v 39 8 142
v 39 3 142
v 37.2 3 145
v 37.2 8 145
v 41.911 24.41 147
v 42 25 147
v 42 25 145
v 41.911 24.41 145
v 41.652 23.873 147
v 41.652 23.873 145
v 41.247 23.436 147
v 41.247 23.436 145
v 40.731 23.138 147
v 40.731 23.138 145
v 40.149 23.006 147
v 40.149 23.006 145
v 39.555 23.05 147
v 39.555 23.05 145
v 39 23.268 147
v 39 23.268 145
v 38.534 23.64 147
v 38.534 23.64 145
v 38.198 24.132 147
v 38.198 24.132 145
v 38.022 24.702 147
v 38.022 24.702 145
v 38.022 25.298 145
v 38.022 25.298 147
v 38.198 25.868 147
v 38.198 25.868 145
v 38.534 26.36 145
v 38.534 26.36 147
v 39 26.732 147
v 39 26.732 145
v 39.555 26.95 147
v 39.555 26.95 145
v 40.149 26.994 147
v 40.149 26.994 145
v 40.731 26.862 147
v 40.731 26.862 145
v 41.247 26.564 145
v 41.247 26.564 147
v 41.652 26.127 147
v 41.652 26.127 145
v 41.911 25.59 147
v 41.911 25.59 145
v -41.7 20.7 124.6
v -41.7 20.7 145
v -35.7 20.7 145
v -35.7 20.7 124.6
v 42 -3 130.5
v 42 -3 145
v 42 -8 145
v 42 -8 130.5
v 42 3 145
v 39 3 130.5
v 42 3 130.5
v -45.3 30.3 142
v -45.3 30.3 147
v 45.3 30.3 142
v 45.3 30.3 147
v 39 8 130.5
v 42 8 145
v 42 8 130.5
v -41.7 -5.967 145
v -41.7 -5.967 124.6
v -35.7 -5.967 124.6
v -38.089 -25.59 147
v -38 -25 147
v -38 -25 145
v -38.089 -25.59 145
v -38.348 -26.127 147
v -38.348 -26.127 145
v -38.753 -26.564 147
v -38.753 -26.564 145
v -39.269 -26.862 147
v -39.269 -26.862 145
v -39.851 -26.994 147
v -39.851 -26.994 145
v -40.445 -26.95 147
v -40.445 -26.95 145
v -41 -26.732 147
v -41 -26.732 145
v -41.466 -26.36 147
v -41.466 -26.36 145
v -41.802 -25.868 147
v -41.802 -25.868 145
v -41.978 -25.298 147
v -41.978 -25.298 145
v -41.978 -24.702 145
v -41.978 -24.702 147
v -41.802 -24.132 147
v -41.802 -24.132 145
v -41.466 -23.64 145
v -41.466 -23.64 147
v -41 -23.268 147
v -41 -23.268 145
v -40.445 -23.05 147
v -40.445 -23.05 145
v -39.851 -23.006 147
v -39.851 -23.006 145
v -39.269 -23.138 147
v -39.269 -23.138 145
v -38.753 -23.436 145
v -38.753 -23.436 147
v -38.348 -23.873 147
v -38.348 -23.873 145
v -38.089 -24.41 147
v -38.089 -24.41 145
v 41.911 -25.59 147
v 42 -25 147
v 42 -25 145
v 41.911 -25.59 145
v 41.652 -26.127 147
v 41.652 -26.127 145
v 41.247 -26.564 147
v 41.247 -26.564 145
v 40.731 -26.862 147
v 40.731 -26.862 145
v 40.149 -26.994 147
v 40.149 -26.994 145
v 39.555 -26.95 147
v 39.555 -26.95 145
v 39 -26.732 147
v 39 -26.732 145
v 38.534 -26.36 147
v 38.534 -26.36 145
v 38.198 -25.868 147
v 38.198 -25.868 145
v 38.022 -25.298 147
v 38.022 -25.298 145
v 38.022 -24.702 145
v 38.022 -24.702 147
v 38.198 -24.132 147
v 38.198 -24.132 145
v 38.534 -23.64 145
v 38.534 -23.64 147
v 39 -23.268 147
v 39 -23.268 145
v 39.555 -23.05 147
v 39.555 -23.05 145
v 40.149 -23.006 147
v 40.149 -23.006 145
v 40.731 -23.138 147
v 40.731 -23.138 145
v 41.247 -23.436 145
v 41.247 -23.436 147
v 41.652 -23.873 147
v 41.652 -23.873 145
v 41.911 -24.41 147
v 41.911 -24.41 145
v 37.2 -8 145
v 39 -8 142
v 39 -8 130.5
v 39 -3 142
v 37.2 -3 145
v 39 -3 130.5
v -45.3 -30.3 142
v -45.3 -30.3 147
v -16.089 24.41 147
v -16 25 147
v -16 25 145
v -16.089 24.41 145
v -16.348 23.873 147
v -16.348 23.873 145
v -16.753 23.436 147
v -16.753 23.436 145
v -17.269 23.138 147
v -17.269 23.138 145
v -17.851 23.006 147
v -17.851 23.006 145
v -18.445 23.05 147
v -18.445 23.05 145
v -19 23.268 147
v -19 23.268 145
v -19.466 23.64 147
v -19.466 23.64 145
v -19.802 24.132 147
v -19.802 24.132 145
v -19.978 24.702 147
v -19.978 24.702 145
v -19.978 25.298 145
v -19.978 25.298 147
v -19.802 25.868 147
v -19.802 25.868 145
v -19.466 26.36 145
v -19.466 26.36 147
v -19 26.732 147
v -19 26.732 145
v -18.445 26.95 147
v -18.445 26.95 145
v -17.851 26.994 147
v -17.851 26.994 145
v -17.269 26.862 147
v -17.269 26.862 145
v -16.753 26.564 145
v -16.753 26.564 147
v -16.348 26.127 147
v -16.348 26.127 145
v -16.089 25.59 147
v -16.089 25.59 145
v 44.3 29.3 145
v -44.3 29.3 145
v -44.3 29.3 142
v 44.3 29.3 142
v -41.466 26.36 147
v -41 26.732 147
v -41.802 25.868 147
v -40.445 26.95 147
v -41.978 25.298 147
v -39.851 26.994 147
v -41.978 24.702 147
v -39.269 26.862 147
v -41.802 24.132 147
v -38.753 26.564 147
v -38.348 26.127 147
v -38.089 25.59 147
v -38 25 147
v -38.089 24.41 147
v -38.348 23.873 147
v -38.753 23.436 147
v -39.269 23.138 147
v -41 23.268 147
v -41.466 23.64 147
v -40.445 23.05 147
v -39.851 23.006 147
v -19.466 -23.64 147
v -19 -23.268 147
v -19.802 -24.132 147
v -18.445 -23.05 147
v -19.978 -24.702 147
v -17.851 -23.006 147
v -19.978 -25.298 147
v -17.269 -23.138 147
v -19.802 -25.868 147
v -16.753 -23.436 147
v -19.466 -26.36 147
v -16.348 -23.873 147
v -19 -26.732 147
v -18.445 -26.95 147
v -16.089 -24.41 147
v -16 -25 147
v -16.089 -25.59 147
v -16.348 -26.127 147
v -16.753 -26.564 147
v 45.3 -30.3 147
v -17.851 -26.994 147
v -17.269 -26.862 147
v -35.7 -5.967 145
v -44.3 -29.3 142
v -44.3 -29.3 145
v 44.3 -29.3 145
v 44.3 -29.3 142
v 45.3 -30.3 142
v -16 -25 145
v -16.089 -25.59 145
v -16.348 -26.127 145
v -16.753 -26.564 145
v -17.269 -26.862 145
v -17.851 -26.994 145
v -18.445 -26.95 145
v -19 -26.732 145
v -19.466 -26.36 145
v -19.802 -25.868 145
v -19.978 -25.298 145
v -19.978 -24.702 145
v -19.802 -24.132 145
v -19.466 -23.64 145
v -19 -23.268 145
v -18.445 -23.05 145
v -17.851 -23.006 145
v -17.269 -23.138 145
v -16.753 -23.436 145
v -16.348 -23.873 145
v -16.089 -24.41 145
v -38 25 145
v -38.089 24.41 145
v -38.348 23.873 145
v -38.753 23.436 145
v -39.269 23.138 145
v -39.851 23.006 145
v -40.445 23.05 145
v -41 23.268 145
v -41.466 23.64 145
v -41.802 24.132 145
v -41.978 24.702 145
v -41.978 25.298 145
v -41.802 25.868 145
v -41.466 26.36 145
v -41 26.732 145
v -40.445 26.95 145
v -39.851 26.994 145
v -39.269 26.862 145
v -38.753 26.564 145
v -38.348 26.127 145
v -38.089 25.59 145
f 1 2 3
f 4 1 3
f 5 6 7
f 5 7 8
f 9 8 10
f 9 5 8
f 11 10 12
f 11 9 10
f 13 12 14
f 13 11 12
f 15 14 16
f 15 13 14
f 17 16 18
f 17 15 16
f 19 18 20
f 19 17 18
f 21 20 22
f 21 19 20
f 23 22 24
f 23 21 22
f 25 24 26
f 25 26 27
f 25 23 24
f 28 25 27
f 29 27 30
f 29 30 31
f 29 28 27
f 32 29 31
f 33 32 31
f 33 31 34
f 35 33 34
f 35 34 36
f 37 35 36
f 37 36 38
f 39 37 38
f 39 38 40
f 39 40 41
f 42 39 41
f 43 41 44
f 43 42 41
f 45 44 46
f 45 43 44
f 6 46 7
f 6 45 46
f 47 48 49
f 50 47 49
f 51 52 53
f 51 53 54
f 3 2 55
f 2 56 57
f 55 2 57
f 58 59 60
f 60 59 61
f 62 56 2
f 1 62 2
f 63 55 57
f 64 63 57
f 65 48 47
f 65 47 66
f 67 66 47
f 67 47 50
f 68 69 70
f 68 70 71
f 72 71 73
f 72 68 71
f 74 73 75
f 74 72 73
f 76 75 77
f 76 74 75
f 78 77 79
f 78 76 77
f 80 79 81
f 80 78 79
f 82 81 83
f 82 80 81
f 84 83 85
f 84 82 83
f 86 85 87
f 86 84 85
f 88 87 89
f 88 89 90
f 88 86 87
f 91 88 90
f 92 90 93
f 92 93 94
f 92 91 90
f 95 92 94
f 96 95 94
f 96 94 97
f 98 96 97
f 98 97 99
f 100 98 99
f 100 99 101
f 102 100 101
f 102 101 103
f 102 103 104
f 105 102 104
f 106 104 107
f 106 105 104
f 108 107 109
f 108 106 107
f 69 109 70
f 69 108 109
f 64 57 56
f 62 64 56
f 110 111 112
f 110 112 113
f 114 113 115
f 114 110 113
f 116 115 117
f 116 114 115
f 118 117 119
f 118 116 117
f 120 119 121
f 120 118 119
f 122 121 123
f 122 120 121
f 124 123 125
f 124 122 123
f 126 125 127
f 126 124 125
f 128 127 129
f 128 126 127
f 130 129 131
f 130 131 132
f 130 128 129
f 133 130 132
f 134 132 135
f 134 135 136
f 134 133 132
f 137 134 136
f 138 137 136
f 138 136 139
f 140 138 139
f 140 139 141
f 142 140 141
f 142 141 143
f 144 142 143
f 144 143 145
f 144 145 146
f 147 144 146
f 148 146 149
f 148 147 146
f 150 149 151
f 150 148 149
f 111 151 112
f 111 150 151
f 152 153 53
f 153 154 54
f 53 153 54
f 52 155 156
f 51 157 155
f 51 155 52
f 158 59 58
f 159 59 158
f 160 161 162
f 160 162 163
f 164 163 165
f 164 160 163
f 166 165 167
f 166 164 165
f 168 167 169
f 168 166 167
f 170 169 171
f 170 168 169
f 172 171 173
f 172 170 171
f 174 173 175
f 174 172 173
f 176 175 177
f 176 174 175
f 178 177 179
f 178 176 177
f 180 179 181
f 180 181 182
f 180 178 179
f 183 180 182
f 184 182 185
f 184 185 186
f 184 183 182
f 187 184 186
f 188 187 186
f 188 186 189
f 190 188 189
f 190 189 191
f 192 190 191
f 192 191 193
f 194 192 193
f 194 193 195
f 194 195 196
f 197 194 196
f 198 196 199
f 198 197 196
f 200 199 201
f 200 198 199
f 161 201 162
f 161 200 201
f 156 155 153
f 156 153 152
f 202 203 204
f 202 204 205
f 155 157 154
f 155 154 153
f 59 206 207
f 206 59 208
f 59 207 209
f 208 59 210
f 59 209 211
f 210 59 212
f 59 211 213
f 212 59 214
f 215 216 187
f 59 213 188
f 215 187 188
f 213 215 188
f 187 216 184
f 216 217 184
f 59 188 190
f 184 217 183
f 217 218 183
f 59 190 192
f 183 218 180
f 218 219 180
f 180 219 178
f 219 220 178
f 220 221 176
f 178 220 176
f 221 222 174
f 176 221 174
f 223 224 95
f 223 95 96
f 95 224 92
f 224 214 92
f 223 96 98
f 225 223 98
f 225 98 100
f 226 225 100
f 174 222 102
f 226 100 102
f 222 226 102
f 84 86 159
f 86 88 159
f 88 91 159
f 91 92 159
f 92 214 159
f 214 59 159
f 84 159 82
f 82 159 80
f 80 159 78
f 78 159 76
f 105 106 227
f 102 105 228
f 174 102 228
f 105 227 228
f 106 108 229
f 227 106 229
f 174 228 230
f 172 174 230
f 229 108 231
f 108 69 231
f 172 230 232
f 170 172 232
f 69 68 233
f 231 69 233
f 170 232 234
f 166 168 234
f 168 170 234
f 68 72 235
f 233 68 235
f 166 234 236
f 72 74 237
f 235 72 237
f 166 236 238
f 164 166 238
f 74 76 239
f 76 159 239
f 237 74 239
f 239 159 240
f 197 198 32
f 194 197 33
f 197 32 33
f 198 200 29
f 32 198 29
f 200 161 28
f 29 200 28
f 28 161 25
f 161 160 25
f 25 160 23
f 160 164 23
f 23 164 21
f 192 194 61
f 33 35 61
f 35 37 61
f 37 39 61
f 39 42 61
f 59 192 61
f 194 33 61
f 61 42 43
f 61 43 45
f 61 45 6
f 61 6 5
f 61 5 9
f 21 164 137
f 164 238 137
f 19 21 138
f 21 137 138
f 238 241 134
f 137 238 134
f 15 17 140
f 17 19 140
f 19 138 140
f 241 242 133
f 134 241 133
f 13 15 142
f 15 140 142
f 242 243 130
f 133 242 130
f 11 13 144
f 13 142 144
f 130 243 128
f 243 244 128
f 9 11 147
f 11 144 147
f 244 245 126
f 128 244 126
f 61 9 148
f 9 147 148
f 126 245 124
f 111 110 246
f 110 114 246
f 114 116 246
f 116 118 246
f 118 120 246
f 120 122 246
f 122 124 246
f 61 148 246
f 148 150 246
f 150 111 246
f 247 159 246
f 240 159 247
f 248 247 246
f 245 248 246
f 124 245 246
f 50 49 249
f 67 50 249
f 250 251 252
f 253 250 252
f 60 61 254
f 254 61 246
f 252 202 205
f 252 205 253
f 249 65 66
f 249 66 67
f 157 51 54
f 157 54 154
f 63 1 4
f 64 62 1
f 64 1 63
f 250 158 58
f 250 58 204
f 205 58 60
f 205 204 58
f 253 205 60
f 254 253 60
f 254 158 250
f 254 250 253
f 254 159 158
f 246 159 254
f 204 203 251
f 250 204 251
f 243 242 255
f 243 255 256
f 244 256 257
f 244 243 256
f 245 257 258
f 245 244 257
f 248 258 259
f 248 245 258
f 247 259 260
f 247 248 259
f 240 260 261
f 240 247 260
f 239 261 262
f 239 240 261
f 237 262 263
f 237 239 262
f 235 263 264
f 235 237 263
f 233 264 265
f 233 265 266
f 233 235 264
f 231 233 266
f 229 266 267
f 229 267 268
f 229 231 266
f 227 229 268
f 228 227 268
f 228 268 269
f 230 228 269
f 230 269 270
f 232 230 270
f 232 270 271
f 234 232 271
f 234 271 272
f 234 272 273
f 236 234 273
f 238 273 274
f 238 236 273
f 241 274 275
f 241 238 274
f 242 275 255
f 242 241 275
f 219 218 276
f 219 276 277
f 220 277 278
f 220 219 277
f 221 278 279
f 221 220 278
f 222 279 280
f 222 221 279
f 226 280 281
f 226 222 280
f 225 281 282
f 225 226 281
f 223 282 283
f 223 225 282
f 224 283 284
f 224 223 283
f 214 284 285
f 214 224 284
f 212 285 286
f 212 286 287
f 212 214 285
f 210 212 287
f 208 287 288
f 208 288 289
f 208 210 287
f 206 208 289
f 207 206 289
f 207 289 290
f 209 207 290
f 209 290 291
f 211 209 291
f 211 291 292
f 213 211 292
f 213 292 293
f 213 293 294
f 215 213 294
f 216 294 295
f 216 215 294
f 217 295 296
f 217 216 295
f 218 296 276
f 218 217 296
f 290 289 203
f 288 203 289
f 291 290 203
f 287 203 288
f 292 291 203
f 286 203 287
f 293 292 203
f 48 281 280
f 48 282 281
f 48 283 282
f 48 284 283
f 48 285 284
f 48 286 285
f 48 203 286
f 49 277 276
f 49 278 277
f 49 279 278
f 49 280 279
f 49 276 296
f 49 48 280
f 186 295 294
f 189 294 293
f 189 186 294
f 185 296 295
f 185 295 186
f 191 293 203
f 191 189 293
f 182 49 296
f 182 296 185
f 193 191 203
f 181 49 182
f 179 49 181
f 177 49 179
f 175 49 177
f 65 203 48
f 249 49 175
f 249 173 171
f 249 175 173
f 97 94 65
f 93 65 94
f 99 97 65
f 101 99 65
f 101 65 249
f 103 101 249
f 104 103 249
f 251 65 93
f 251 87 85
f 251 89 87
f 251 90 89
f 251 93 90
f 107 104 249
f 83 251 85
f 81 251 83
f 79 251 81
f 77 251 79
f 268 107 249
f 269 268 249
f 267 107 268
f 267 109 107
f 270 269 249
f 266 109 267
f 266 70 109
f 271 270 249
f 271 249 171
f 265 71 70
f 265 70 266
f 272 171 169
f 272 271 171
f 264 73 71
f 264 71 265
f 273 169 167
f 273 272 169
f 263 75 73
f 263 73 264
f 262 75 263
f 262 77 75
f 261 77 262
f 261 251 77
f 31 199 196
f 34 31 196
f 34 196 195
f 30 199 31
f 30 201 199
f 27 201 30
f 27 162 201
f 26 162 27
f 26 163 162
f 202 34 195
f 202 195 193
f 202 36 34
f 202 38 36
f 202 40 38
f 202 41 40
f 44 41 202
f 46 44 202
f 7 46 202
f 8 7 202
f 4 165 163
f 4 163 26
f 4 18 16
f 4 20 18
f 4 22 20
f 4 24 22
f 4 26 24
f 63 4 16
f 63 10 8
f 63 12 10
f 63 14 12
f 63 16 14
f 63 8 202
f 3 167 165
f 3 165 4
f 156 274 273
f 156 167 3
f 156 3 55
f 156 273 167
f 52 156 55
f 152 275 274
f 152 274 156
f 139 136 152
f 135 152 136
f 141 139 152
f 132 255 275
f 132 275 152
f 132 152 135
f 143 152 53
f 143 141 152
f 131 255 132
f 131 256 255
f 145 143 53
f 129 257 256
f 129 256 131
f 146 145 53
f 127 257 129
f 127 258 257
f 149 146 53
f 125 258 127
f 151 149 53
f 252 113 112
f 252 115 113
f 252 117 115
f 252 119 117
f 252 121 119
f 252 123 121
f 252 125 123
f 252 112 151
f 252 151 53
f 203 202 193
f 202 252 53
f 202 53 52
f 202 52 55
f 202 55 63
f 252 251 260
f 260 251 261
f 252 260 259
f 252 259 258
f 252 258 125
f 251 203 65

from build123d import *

# Parameters (mm, degrees)
SKETCH015_W             = 90
SKETCH015_H             = 60
SKETCH015_R             = 2
PAD009_DEPTH            = 2
SKETCH016_W             = 90.6
SKETCH016_H             = 60.6
SKETCH016_W_2           = 88.6
SKETCH016_H_2           = 58.6
PAD010_DEPTH            = 5
SKETCH017_W             = 6
SKETCH017_H             = 26.666667
PAD011_DEPTH            = 22.4
PAD014_START            = -3
PAD014_DEPTH            = 5
PAD015_START            = 3
PAD015_DEPTH            = 5
BODY004_PLACEMENT_ANGLE = 180


with BuildPart() as part:
    # Sketch015 → Pad009 (new body)
    with BuildSketch(Plane.XY):
        Rectangle(SKETCH015_W, SKETCH015_H)
        with Locations((-40, 25)):
            Circle(SKETCH015_R, mode=Mode.SUBTRACT)
        with Locations((-18, 25)):
            Circle(SKETCH015_R, mode=Mode.SUBTRACT)
        with Locations((40, 25)):
            Circle(SKETCH015_R, mode=Mode.SUBTRACT)
        with Locations((40, -25)):
            Circle(SKETCH015_R, mode=Mode.SUBTRACT)
        with Locations((-18, -25)):
            Circle(SKETCH015_R, mode=Mode.SUBTRACT)
        with Locations((-40, -25)):
            Circle(SKETCH015_R, mode=Mode.SUBTRACT)
    extrude(amount=PAD009_DEPTH)

    # Sketch016 → Pad010 (join)
    with BuildSketch(Plane.XY):
        Rectangle(SKETCH016_W, SKETCH016_H)
        Rectangle(SKETCH016_W_2, SKETCH016_H_2, mode=Mode.SUBTRACT)
    extrude(amount=PAD010_DEPTH)

    # Sketch017 → Pad011 (join)
    with BuildSketch(Plane.XY):
        with Locations((-38.7, -7.366666)):
            Rectangle(SKETCH017_W, SKETCH017_H)
    extrude(amount=PAD011_DEPTH)

    # Sketch020 → Pad014 (join)
    with BuildSketch(Plane.XZ.offset(PAD014_START)):
        Polygon((36, 0), (42, 0), (42, 16.5), (39, 16.5), (39, 5), align=None)
    extrude(amount=-PAD014_DEPTH)

    # Sketch020 → Pad015 (join)
    with BuildSketch(Plane.XZ.offset(PAD015_START)):
        Polygon((36, 0), (42, 0), (42, 16.5), (39, 16.5), (39, 5), align=None)
    extrude(amount=PAD015_DEPTH)


with BuildPart() as part_1:
    # Body004 placement: moved
    add(part.part.moved(Location((0, 0, 147))).rotate(Axis((0, 0, 147), (1, 0, 0)), BODY004_PLACEMENT_ANGLE))


solid = part_1.part
